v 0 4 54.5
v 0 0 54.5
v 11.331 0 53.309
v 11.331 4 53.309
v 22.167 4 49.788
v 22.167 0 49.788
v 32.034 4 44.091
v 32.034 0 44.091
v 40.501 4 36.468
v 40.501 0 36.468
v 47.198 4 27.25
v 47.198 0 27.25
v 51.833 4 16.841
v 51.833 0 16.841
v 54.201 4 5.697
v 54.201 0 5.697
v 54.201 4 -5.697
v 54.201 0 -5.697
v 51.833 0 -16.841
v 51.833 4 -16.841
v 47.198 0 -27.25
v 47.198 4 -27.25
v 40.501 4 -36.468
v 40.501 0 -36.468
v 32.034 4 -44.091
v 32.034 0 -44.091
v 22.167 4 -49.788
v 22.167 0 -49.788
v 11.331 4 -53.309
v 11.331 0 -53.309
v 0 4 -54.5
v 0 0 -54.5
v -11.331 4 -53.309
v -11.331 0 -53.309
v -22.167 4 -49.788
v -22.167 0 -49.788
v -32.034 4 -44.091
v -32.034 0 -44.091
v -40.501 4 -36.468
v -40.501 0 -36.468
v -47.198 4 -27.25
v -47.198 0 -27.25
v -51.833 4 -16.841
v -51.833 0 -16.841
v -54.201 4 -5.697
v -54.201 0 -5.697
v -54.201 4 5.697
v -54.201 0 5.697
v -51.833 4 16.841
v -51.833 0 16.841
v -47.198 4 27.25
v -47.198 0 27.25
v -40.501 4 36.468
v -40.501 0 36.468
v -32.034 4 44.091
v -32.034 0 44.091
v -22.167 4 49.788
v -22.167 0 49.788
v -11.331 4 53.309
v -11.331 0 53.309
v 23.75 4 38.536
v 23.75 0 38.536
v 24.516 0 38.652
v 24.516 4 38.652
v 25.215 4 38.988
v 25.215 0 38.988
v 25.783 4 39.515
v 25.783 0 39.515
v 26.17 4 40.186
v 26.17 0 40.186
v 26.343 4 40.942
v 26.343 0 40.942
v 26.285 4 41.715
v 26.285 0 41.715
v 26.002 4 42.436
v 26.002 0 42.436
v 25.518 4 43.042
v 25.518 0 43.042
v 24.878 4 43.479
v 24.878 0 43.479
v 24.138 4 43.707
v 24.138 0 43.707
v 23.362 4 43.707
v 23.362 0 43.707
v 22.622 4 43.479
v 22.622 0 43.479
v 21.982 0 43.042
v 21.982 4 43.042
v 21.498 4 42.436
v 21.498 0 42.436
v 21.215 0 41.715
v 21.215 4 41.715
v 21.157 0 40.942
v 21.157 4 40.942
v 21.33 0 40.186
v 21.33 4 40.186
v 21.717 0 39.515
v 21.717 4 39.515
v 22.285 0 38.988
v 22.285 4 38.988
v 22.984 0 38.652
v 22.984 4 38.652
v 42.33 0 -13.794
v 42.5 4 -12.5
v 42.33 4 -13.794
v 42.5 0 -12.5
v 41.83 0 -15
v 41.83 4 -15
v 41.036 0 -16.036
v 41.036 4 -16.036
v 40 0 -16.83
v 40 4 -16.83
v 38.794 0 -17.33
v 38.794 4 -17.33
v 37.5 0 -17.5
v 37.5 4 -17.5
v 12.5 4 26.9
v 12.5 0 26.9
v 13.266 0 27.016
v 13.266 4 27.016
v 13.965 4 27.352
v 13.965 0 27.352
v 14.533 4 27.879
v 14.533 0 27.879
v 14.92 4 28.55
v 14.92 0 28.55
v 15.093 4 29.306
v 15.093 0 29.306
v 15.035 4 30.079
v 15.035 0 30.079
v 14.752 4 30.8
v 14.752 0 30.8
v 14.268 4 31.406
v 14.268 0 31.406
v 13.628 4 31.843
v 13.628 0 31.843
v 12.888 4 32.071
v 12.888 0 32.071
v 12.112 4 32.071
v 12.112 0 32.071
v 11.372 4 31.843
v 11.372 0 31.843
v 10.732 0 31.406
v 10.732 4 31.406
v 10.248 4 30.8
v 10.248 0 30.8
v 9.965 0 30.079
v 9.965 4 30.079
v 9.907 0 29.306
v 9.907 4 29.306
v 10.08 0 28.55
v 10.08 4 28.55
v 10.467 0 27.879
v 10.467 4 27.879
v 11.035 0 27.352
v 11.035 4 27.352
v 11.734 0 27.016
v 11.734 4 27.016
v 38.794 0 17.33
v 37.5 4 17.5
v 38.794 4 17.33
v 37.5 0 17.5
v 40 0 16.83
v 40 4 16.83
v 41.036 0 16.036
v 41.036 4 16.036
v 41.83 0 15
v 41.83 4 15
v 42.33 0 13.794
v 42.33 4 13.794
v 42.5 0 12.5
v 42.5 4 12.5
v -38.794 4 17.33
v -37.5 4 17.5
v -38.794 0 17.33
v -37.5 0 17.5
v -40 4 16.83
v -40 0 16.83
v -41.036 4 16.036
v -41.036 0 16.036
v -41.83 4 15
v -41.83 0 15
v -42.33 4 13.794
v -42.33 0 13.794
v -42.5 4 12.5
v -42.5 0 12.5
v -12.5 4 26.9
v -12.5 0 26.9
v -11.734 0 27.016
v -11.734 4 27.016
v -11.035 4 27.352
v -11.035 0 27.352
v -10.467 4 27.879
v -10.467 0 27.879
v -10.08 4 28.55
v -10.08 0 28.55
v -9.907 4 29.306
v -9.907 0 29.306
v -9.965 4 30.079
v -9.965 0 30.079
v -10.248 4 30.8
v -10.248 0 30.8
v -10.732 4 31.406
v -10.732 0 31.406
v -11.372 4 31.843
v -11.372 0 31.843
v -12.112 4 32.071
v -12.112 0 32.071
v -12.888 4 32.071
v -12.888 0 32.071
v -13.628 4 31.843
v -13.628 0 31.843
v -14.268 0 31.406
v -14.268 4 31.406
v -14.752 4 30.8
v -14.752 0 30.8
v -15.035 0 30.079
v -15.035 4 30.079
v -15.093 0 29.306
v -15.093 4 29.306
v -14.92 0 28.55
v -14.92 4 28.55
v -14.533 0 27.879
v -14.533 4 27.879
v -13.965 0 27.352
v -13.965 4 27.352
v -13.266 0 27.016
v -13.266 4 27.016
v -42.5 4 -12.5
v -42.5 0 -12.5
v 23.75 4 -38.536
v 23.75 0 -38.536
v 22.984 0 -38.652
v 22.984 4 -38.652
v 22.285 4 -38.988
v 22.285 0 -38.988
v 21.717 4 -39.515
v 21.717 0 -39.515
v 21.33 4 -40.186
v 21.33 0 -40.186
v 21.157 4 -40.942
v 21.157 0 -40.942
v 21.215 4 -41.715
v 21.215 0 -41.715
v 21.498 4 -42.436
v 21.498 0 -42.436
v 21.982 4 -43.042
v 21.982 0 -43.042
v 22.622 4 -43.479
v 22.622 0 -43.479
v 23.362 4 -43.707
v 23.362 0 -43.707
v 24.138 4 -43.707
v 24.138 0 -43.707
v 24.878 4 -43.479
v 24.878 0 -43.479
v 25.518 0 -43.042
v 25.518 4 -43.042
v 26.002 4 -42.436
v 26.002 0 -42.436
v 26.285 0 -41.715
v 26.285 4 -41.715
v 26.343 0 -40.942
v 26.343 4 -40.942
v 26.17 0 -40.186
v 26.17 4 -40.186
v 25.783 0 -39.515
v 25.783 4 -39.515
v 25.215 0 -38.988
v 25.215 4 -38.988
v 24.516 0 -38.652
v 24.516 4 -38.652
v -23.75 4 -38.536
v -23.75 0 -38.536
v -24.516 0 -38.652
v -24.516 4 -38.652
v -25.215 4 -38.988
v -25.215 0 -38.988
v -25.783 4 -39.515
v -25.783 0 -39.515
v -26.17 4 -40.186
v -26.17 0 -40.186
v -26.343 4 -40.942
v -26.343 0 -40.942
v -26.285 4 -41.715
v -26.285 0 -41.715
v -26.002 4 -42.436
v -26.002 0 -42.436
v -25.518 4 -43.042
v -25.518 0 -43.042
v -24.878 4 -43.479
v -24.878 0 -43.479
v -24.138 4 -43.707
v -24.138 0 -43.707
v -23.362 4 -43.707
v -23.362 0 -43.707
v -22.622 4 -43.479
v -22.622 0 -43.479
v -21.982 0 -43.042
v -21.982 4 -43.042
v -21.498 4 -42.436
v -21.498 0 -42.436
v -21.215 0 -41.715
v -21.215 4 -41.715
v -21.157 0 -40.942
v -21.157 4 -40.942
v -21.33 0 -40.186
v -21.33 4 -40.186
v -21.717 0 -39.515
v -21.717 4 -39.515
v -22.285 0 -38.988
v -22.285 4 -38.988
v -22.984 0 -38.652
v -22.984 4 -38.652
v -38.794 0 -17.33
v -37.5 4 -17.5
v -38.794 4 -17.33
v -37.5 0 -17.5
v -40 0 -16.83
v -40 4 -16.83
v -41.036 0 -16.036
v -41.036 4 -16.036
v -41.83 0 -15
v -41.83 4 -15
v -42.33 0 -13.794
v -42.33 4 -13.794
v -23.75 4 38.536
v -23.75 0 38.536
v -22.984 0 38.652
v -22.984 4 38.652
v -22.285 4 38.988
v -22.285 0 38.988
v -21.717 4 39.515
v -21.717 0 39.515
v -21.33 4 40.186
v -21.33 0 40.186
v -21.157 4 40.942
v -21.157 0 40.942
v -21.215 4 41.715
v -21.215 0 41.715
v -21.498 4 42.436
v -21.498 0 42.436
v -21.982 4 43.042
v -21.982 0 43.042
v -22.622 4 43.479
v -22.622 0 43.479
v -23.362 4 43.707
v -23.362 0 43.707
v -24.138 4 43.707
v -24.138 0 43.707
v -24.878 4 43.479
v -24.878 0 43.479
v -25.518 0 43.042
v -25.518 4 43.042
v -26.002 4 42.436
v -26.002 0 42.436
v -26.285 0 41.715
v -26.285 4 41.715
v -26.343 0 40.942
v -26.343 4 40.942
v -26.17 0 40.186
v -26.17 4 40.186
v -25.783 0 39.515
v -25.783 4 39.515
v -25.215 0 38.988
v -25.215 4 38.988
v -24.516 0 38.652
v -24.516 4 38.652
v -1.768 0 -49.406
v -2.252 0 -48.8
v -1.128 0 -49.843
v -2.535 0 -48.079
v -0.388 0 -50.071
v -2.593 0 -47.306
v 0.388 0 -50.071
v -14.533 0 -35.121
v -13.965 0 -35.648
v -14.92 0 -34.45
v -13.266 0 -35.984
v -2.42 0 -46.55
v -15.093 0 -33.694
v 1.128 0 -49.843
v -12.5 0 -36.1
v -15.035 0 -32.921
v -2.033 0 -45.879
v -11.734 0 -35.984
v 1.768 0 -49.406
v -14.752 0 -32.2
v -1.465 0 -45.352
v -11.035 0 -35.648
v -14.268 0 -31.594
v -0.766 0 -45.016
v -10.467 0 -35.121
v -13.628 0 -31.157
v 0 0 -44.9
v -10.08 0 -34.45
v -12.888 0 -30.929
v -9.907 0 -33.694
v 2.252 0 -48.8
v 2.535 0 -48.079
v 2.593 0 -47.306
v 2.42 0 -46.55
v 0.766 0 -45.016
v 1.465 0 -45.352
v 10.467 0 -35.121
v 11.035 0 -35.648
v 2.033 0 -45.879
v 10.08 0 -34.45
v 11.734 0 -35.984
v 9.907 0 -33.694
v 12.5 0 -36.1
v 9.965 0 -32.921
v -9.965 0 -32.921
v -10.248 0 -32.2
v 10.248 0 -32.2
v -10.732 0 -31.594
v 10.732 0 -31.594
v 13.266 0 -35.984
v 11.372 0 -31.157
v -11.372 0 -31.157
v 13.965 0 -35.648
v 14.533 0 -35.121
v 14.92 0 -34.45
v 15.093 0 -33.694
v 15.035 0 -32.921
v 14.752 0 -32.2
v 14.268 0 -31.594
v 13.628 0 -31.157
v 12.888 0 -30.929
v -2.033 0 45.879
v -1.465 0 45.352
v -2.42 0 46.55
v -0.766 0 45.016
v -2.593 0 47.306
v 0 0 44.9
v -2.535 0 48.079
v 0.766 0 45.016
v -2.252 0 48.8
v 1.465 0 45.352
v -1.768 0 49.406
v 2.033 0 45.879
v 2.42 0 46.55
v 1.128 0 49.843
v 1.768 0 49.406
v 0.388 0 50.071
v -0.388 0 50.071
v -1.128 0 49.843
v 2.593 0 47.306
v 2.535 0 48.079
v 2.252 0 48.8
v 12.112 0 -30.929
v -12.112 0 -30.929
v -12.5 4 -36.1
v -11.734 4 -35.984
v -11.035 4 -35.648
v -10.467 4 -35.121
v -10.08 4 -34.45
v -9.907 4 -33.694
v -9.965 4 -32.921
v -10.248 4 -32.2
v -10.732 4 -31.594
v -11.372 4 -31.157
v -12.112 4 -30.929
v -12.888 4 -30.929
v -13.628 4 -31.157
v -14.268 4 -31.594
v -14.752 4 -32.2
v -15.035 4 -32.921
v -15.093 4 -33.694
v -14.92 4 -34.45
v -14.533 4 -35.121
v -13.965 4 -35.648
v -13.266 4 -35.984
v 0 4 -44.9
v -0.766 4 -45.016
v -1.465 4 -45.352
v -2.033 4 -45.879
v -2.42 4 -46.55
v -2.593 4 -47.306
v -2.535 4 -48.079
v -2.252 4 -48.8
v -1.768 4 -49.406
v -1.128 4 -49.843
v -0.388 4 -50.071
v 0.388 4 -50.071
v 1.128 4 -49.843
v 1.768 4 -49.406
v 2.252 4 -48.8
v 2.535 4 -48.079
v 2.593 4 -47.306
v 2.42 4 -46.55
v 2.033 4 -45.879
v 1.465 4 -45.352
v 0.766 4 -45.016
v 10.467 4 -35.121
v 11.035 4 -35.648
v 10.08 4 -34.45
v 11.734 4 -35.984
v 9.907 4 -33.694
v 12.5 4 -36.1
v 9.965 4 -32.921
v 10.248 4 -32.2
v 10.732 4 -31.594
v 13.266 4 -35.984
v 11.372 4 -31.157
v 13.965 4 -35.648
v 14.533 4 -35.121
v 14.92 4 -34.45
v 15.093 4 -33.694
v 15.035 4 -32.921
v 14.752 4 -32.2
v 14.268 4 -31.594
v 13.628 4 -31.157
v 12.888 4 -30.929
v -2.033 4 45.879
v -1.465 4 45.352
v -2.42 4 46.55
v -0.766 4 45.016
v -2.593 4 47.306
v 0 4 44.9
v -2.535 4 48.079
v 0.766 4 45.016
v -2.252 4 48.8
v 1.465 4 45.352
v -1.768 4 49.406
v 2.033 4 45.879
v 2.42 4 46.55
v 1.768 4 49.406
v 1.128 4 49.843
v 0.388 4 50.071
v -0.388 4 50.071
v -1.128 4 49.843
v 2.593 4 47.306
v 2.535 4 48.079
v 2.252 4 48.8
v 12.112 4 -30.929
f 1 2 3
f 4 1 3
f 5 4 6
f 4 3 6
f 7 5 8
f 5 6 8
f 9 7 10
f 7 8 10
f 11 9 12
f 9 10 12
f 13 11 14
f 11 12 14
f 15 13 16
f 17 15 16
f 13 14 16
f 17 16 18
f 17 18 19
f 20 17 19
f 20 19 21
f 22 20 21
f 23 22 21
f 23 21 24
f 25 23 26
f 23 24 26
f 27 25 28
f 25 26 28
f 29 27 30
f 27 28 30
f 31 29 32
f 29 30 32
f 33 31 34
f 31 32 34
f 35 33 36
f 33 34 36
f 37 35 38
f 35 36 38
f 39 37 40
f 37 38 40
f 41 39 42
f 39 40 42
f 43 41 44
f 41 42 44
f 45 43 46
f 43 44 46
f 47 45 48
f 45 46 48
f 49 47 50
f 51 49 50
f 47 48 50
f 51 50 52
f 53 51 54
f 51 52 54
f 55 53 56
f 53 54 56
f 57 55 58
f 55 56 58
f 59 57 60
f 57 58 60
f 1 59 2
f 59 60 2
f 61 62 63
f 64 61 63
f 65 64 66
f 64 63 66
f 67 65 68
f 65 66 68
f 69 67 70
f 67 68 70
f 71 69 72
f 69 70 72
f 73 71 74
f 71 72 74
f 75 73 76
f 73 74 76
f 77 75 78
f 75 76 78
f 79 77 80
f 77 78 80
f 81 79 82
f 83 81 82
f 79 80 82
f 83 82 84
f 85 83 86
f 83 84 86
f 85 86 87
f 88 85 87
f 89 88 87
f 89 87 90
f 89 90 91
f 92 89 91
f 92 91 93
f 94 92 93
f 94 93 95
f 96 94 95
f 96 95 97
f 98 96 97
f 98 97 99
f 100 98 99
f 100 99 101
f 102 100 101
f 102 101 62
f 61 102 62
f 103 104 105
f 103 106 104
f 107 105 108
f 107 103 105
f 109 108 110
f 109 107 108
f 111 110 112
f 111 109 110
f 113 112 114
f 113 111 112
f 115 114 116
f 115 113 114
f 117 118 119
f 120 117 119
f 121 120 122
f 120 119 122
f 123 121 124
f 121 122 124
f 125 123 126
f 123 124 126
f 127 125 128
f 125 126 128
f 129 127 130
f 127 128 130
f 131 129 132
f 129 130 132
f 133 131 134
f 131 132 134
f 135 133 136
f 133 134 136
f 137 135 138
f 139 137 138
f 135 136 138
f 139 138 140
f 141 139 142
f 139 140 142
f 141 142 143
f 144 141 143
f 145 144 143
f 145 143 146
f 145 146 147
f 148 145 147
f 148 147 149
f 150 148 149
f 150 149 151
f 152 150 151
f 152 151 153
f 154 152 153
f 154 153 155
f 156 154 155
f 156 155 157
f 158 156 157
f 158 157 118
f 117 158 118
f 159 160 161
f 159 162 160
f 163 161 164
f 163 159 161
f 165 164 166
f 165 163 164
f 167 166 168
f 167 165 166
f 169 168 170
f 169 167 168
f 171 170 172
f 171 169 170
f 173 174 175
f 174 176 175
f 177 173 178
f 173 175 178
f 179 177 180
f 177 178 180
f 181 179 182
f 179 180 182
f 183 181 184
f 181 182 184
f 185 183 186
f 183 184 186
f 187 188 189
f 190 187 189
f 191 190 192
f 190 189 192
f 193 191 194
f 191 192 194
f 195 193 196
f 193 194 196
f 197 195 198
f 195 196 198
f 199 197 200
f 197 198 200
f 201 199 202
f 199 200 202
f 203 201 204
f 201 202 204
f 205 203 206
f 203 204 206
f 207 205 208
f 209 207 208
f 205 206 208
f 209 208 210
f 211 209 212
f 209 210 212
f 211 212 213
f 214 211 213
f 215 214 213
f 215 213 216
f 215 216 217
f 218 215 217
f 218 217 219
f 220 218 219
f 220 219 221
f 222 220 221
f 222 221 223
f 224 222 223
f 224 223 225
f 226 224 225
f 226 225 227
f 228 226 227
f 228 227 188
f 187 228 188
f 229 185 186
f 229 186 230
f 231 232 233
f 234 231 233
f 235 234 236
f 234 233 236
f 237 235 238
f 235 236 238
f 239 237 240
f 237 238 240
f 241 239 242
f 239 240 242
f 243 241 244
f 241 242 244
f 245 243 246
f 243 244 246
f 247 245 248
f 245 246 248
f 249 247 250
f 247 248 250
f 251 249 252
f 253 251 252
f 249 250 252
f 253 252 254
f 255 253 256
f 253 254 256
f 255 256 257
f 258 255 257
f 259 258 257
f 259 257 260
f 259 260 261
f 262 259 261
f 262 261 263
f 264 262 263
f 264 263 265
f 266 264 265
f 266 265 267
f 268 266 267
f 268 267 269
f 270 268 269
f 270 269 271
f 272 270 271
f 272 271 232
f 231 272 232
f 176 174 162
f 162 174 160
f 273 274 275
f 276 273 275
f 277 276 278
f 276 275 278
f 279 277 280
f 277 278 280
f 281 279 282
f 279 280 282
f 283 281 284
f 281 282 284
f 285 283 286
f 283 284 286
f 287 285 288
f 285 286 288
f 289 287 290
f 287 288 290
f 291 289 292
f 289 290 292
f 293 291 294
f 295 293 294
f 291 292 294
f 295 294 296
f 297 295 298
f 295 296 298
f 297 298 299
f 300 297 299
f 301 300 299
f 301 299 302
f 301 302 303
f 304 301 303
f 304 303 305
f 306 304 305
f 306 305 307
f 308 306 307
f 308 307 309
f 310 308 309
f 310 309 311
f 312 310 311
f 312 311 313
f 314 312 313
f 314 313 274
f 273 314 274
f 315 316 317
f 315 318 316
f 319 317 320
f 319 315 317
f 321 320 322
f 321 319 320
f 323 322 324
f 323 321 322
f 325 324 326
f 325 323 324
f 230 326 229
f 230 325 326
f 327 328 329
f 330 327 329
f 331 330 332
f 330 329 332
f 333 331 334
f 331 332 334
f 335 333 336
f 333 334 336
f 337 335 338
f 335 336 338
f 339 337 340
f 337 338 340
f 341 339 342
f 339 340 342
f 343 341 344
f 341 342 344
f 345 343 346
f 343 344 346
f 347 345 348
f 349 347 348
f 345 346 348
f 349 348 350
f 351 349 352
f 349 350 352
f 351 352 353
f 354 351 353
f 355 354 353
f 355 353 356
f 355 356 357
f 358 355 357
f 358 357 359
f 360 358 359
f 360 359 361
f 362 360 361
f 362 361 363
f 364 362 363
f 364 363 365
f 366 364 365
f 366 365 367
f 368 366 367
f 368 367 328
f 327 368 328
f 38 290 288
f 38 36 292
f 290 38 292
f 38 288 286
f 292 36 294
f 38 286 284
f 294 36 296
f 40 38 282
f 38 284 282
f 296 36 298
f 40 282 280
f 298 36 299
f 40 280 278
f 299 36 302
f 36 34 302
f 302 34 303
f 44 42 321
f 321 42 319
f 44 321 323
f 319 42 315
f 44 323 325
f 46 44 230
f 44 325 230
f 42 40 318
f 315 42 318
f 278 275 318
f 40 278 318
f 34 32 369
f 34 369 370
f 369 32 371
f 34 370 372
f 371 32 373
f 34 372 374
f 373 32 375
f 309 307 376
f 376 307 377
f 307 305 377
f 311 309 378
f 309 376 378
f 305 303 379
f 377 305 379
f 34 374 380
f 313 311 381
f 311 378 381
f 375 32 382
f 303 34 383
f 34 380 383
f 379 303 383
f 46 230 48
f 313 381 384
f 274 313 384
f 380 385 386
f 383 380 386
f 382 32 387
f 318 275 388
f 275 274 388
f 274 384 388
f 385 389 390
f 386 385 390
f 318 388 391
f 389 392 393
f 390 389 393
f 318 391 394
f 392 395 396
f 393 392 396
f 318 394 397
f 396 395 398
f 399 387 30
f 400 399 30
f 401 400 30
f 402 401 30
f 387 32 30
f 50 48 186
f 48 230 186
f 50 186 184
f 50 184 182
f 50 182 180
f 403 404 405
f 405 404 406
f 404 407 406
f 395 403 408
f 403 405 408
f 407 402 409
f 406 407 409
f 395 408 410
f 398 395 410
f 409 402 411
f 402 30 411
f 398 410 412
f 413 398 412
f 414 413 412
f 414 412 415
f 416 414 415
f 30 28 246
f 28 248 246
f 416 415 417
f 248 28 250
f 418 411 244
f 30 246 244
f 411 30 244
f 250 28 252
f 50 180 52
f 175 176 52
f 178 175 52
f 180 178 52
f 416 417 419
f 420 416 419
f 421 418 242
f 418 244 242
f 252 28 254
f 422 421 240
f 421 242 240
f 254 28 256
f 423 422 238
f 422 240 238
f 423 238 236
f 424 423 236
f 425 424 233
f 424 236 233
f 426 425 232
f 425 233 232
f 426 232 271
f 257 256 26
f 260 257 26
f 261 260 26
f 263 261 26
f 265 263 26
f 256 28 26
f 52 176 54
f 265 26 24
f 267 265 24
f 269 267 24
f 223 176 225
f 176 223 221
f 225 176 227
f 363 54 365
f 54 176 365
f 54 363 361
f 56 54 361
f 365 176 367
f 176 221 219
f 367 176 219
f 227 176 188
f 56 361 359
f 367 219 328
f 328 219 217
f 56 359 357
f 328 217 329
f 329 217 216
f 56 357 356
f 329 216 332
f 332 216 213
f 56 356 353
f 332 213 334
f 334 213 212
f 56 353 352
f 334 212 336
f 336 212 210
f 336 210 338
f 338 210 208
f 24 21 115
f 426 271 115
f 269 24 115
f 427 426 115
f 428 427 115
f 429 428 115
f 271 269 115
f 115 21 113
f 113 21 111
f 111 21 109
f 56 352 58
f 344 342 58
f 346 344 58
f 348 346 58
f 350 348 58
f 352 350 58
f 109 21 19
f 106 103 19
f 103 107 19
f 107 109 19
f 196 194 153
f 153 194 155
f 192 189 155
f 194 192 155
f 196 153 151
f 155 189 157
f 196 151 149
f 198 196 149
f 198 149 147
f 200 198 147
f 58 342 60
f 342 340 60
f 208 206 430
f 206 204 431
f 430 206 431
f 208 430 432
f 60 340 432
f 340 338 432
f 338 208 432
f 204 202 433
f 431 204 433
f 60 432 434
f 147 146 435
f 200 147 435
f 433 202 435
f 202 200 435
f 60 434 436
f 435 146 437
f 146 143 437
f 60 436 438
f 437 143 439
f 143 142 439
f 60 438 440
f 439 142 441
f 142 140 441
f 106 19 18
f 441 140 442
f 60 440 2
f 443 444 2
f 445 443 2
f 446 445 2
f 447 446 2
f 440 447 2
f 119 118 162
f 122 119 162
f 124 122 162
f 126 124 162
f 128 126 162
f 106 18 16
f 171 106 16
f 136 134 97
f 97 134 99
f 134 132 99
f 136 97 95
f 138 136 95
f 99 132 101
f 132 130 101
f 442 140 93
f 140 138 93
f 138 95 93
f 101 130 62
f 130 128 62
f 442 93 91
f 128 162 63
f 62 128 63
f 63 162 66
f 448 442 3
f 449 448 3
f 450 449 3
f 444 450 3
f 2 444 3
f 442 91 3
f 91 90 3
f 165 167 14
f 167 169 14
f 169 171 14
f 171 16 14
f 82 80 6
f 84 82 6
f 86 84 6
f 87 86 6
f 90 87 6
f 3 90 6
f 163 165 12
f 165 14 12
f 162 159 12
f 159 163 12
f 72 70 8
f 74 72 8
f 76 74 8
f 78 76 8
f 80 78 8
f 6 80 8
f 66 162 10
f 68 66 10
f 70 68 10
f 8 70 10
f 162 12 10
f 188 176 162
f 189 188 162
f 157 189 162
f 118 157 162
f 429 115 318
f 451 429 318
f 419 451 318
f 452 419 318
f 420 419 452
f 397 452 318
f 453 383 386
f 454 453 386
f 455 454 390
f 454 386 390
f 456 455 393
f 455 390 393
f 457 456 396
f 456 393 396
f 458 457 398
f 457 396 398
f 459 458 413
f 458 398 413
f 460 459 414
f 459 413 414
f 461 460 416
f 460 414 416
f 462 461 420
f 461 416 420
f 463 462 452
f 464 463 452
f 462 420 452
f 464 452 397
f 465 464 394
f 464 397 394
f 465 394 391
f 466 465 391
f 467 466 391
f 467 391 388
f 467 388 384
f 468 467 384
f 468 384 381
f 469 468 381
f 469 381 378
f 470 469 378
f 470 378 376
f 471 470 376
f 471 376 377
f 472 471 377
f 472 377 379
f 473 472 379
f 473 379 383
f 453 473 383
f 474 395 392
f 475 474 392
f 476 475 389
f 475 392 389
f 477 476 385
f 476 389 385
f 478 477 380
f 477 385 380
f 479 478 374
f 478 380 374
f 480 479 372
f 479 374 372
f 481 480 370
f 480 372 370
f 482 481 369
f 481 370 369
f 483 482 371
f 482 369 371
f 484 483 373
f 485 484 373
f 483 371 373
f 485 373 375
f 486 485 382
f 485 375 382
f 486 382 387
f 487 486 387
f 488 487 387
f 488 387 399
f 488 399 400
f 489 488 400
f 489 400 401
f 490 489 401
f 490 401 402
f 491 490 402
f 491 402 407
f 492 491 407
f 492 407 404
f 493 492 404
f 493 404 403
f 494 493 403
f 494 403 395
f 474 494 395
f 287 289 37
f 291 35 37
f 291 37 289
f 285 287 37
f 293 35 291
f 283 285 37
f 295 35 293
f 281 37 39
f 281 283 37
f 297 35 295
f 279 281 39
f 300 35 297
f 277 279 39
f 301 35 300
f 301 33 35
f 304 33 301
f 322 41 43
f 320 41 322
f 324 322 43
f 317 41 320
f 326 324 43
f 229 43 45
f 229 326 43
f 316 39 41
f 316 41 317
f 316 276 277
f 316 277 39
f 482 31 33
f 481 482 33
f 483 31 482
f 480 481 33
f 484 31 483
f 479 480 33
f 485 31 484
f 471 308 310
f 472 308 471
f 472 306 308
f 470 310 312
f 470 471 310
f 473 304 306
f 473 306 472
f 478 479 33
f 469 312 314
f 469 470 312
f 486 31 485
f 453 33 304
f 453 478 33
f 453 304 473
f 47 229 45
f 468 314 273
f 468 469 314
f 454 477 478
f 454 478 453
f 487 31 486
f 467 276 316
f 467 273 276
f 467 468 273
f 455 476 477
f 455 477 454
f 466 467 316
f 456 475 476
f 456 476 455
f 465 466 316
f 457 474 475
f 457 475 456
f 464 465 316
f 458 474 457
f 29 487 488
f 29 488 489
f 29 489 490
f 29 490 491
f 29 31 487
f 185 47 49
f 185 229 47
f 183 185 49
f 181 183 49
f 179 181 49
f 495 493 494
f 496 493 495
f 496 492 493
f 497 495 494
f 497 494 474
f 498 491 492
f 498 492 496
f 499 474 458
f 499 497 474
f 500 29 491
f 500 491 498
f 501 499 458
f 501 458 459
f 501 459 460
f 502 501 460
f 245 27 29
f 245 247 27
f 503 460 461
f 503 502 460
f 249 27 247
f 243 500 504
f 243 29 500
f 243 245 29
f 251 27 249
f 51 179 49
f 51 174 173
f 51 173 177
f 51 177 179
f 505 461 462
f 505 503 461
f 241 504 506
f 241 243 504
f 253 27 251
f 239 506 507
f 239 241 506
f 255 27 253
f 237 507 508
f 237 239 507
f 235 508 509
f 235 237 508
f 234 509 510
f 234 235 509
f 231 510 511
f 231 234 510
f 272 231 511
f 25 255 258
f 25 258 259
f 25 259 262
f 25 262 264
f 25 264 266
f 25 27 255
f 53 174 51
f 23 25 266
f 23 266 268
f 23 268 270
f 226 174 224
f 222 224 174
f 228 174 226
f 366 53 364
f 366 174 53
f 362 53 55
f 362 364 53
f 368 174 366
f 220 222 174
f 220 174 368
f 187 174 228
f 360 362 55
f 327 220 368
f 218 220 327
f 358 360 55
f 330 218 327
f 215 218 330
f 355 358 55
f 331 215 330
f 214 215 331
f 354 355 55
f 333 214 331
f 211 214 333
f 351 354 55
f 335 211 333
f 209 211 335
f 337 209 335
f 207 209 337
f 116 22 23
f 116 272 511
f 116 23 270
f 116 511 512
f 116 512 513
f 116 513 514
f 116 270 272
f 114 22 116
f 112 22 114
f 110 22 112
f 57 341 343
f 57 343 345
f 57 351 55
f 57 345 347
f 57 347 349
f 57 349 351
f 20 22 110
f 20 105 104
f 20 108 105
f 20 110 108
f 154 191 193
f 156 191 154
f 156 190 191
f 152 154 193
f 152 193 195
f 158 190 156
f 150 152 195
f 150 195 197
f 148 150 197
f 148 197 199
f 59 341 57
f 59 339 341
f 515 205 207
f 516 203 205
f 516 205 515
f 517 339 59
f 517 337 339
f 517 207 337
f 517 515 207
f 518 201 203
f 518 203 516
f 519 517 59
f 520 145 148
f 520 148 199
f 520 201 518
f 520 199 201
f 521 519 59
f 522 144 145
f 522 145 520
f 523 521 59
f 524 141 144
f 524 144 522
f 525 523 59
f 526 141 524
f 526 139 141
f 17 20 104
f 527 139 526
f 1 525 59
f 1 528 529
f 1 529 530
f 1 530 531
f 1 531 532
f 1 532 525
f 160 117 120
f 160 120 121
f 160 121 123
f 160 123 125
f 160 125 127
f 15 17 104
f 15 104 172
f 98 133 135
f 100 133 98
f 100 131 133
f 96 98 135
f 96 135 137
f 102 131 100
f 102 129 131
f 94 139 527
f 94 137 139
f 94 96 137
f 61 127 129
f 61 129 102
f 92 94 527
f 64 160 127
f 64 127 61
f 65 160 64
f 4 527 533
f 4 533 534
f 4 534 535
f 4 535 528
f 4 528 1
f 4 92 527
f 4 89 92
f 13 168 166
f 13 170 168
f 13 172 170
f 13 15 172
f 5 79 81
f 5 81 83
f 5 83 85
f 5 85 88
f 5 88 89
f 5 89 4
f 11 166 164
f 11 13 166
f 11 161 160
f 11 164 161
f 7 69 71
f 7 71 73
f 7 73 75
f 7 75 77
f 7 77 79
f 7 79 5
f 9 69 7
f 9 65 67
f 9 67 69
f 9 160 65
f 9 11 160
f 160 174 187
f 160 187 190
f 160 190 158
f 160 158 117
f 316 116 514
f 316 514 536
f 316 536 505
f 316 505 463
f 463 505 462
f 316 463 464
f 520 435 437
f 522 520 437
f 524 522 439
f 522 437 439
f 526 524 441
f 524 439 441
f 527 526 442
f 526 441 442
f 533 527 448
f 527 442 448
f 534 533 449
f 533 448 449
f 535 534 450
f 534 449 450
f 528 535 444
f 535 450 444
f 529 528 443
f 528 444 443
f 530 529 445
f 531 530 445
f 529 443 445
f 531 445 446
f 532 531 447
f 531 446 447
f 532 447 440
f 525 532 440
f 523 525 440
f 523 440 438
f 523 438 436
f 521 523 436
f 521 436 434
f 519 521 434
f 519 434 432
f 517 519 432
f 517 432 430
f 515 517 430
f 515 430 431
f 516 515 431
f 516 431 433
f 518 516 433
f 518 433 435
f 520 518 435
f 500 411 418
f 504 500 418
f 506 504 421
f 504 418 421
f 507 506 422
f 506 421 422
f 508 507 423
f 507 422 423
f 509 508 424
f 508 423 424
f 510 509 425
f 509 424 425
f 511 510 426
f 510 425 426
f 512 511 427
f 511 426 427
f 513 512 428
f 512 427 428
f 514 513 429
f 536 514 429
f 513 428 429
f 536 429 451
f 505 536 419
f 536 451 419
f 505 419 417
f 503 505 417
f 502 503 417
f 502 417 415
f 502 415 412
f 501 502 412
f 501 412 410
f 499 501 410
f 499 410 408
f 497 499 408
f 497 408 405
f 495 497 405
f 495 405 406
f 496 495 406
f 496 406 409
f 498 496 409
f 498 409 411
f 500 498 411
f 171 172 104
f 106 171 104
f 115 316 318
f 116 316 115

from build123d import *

# Parameters (mm, degrees)
SKETCH_1_R               = 54.5
EXTRUDE_1_DEPTH          = 4
SKETCH_2_W               = 85
SKETCH_2_H               = 35
CUT_EXTRUDE_1_DEPTH      = 4
FILLET_1_R               = 5
SKETCH_3_R               = 2.6
CUT_EXTRUDE_2_DEPTH      = 10
PATTERN_CIRCULAR_1_COUNT = 2
SKETCH_4_R               = 2.6
CUT_EXTRUDE_3_DEPTH      = 10
SKETCH_5_R               = 2.6
CUT_EXTRUDE_4_DEPTH      = 100


with BuildPart() as part:
    # 草图1 → 凸台-拉伸1 (new body)
    with BuildSketch(Plane(origin=(0, 0, 0), x_dir=(1, 0, 0), z_dir=(0, 1, 0))):
        with Locations(Location((0, 0, 0), (0, 0, 270))):
            Circle(SKETCH_1_R)
    extrude(amount=EXTRUDE_1_DEPTH)

    # 草图2 → 切除-拉伸1 (cut)
    with BuildSketch(Plane(origin=(0, 4, 0), x_dir=(1, 0, 0), z_dir=(0, 1, 0))):
        Rectangle(SKETCH_2_W, SKETCH_2_H)
    extrude(amount=-CUT_EXTRUDE_1_DEPTH, mode=Mode.SUBTRACT)

    # 圆角1
    fillet_1_edges = [part.edges().sort_by_distance(p)[0] for p in [
        (42.5, 2, -17.5),
        (42.5, 2, 17.5),
        (-42.5, 2, 17.5),
        (-42.5, 2, -17.5),
    ]]
    fillet(fillet_1_edges, radius=FILLET_1_R)

    # 草图3 → 切除-拉伸2 (cut)
    with BuildSketch(Plane.XZ):
        with Locations(Location((-23.75, 41.13620668, 0), (0, 0, 270))):
            Circle(SKETCH_3_R)
        with Locations(Location((23.75, 41.13620668, 0), (0, 0, 270))):
            Circle(SKETCH_3_R)
        with Locations(Location((0, 47.5, 0), (0, 0, 270))):
            Circle(SKETCH_3_R)
    cut_extrude_2 = extrude(amount=-CUT_EXTRUDE_2_DEPTH, mode=Mode.SUBTRACT)

    # 阵列(圆周)1: 切除-拉伸2 ×2 about axis
    pattern_circular_1_axis = Axis((0, 0, 0), (0, 1, 0))
    for i in range(1, PATTERN_CIRCULAR_1_COUNT):
        add(cut_extrude_2.rotate(pattern_circular_1_axis, i * 360 / PATTERN_CIRCULAR_1_COUNT), mode=Mode.SUBTRACT)

    # 草图4 → 切除-拉伸3 (cut)
    with BuildSketch(Plane.XZ):
        with Locations(Location((-12.5, 29.5, 0), (0, 0, 270))):
            Circle(SKETCH_4_R)
        with Locations(Location((12.5, 29.5, 0), (0, 0, 270))):
            Circle(SKETCH_4_R)
    extrude(amount=-CUT_EXTRUDE_3_DEPTH, mode=Mode.SUBTRACT)

    # 草图5 → 切除-拉伸4 (cut)
    with BuildSketch(Plane.XZ):
        with Locations(Location((-12.5, -33.5, 0), (0, 0, 270))):
            Circle(SKETCH_5_R)
        with Locations(Location((12.5, -33.5, 0), (0, 0, 270))):
            Circle(SKETCH_5_R)
    extrude(amount=-CUT_EXTRUDE_4_DEPTH, mode=Mode.SUBTRACT)


solid = part.part
